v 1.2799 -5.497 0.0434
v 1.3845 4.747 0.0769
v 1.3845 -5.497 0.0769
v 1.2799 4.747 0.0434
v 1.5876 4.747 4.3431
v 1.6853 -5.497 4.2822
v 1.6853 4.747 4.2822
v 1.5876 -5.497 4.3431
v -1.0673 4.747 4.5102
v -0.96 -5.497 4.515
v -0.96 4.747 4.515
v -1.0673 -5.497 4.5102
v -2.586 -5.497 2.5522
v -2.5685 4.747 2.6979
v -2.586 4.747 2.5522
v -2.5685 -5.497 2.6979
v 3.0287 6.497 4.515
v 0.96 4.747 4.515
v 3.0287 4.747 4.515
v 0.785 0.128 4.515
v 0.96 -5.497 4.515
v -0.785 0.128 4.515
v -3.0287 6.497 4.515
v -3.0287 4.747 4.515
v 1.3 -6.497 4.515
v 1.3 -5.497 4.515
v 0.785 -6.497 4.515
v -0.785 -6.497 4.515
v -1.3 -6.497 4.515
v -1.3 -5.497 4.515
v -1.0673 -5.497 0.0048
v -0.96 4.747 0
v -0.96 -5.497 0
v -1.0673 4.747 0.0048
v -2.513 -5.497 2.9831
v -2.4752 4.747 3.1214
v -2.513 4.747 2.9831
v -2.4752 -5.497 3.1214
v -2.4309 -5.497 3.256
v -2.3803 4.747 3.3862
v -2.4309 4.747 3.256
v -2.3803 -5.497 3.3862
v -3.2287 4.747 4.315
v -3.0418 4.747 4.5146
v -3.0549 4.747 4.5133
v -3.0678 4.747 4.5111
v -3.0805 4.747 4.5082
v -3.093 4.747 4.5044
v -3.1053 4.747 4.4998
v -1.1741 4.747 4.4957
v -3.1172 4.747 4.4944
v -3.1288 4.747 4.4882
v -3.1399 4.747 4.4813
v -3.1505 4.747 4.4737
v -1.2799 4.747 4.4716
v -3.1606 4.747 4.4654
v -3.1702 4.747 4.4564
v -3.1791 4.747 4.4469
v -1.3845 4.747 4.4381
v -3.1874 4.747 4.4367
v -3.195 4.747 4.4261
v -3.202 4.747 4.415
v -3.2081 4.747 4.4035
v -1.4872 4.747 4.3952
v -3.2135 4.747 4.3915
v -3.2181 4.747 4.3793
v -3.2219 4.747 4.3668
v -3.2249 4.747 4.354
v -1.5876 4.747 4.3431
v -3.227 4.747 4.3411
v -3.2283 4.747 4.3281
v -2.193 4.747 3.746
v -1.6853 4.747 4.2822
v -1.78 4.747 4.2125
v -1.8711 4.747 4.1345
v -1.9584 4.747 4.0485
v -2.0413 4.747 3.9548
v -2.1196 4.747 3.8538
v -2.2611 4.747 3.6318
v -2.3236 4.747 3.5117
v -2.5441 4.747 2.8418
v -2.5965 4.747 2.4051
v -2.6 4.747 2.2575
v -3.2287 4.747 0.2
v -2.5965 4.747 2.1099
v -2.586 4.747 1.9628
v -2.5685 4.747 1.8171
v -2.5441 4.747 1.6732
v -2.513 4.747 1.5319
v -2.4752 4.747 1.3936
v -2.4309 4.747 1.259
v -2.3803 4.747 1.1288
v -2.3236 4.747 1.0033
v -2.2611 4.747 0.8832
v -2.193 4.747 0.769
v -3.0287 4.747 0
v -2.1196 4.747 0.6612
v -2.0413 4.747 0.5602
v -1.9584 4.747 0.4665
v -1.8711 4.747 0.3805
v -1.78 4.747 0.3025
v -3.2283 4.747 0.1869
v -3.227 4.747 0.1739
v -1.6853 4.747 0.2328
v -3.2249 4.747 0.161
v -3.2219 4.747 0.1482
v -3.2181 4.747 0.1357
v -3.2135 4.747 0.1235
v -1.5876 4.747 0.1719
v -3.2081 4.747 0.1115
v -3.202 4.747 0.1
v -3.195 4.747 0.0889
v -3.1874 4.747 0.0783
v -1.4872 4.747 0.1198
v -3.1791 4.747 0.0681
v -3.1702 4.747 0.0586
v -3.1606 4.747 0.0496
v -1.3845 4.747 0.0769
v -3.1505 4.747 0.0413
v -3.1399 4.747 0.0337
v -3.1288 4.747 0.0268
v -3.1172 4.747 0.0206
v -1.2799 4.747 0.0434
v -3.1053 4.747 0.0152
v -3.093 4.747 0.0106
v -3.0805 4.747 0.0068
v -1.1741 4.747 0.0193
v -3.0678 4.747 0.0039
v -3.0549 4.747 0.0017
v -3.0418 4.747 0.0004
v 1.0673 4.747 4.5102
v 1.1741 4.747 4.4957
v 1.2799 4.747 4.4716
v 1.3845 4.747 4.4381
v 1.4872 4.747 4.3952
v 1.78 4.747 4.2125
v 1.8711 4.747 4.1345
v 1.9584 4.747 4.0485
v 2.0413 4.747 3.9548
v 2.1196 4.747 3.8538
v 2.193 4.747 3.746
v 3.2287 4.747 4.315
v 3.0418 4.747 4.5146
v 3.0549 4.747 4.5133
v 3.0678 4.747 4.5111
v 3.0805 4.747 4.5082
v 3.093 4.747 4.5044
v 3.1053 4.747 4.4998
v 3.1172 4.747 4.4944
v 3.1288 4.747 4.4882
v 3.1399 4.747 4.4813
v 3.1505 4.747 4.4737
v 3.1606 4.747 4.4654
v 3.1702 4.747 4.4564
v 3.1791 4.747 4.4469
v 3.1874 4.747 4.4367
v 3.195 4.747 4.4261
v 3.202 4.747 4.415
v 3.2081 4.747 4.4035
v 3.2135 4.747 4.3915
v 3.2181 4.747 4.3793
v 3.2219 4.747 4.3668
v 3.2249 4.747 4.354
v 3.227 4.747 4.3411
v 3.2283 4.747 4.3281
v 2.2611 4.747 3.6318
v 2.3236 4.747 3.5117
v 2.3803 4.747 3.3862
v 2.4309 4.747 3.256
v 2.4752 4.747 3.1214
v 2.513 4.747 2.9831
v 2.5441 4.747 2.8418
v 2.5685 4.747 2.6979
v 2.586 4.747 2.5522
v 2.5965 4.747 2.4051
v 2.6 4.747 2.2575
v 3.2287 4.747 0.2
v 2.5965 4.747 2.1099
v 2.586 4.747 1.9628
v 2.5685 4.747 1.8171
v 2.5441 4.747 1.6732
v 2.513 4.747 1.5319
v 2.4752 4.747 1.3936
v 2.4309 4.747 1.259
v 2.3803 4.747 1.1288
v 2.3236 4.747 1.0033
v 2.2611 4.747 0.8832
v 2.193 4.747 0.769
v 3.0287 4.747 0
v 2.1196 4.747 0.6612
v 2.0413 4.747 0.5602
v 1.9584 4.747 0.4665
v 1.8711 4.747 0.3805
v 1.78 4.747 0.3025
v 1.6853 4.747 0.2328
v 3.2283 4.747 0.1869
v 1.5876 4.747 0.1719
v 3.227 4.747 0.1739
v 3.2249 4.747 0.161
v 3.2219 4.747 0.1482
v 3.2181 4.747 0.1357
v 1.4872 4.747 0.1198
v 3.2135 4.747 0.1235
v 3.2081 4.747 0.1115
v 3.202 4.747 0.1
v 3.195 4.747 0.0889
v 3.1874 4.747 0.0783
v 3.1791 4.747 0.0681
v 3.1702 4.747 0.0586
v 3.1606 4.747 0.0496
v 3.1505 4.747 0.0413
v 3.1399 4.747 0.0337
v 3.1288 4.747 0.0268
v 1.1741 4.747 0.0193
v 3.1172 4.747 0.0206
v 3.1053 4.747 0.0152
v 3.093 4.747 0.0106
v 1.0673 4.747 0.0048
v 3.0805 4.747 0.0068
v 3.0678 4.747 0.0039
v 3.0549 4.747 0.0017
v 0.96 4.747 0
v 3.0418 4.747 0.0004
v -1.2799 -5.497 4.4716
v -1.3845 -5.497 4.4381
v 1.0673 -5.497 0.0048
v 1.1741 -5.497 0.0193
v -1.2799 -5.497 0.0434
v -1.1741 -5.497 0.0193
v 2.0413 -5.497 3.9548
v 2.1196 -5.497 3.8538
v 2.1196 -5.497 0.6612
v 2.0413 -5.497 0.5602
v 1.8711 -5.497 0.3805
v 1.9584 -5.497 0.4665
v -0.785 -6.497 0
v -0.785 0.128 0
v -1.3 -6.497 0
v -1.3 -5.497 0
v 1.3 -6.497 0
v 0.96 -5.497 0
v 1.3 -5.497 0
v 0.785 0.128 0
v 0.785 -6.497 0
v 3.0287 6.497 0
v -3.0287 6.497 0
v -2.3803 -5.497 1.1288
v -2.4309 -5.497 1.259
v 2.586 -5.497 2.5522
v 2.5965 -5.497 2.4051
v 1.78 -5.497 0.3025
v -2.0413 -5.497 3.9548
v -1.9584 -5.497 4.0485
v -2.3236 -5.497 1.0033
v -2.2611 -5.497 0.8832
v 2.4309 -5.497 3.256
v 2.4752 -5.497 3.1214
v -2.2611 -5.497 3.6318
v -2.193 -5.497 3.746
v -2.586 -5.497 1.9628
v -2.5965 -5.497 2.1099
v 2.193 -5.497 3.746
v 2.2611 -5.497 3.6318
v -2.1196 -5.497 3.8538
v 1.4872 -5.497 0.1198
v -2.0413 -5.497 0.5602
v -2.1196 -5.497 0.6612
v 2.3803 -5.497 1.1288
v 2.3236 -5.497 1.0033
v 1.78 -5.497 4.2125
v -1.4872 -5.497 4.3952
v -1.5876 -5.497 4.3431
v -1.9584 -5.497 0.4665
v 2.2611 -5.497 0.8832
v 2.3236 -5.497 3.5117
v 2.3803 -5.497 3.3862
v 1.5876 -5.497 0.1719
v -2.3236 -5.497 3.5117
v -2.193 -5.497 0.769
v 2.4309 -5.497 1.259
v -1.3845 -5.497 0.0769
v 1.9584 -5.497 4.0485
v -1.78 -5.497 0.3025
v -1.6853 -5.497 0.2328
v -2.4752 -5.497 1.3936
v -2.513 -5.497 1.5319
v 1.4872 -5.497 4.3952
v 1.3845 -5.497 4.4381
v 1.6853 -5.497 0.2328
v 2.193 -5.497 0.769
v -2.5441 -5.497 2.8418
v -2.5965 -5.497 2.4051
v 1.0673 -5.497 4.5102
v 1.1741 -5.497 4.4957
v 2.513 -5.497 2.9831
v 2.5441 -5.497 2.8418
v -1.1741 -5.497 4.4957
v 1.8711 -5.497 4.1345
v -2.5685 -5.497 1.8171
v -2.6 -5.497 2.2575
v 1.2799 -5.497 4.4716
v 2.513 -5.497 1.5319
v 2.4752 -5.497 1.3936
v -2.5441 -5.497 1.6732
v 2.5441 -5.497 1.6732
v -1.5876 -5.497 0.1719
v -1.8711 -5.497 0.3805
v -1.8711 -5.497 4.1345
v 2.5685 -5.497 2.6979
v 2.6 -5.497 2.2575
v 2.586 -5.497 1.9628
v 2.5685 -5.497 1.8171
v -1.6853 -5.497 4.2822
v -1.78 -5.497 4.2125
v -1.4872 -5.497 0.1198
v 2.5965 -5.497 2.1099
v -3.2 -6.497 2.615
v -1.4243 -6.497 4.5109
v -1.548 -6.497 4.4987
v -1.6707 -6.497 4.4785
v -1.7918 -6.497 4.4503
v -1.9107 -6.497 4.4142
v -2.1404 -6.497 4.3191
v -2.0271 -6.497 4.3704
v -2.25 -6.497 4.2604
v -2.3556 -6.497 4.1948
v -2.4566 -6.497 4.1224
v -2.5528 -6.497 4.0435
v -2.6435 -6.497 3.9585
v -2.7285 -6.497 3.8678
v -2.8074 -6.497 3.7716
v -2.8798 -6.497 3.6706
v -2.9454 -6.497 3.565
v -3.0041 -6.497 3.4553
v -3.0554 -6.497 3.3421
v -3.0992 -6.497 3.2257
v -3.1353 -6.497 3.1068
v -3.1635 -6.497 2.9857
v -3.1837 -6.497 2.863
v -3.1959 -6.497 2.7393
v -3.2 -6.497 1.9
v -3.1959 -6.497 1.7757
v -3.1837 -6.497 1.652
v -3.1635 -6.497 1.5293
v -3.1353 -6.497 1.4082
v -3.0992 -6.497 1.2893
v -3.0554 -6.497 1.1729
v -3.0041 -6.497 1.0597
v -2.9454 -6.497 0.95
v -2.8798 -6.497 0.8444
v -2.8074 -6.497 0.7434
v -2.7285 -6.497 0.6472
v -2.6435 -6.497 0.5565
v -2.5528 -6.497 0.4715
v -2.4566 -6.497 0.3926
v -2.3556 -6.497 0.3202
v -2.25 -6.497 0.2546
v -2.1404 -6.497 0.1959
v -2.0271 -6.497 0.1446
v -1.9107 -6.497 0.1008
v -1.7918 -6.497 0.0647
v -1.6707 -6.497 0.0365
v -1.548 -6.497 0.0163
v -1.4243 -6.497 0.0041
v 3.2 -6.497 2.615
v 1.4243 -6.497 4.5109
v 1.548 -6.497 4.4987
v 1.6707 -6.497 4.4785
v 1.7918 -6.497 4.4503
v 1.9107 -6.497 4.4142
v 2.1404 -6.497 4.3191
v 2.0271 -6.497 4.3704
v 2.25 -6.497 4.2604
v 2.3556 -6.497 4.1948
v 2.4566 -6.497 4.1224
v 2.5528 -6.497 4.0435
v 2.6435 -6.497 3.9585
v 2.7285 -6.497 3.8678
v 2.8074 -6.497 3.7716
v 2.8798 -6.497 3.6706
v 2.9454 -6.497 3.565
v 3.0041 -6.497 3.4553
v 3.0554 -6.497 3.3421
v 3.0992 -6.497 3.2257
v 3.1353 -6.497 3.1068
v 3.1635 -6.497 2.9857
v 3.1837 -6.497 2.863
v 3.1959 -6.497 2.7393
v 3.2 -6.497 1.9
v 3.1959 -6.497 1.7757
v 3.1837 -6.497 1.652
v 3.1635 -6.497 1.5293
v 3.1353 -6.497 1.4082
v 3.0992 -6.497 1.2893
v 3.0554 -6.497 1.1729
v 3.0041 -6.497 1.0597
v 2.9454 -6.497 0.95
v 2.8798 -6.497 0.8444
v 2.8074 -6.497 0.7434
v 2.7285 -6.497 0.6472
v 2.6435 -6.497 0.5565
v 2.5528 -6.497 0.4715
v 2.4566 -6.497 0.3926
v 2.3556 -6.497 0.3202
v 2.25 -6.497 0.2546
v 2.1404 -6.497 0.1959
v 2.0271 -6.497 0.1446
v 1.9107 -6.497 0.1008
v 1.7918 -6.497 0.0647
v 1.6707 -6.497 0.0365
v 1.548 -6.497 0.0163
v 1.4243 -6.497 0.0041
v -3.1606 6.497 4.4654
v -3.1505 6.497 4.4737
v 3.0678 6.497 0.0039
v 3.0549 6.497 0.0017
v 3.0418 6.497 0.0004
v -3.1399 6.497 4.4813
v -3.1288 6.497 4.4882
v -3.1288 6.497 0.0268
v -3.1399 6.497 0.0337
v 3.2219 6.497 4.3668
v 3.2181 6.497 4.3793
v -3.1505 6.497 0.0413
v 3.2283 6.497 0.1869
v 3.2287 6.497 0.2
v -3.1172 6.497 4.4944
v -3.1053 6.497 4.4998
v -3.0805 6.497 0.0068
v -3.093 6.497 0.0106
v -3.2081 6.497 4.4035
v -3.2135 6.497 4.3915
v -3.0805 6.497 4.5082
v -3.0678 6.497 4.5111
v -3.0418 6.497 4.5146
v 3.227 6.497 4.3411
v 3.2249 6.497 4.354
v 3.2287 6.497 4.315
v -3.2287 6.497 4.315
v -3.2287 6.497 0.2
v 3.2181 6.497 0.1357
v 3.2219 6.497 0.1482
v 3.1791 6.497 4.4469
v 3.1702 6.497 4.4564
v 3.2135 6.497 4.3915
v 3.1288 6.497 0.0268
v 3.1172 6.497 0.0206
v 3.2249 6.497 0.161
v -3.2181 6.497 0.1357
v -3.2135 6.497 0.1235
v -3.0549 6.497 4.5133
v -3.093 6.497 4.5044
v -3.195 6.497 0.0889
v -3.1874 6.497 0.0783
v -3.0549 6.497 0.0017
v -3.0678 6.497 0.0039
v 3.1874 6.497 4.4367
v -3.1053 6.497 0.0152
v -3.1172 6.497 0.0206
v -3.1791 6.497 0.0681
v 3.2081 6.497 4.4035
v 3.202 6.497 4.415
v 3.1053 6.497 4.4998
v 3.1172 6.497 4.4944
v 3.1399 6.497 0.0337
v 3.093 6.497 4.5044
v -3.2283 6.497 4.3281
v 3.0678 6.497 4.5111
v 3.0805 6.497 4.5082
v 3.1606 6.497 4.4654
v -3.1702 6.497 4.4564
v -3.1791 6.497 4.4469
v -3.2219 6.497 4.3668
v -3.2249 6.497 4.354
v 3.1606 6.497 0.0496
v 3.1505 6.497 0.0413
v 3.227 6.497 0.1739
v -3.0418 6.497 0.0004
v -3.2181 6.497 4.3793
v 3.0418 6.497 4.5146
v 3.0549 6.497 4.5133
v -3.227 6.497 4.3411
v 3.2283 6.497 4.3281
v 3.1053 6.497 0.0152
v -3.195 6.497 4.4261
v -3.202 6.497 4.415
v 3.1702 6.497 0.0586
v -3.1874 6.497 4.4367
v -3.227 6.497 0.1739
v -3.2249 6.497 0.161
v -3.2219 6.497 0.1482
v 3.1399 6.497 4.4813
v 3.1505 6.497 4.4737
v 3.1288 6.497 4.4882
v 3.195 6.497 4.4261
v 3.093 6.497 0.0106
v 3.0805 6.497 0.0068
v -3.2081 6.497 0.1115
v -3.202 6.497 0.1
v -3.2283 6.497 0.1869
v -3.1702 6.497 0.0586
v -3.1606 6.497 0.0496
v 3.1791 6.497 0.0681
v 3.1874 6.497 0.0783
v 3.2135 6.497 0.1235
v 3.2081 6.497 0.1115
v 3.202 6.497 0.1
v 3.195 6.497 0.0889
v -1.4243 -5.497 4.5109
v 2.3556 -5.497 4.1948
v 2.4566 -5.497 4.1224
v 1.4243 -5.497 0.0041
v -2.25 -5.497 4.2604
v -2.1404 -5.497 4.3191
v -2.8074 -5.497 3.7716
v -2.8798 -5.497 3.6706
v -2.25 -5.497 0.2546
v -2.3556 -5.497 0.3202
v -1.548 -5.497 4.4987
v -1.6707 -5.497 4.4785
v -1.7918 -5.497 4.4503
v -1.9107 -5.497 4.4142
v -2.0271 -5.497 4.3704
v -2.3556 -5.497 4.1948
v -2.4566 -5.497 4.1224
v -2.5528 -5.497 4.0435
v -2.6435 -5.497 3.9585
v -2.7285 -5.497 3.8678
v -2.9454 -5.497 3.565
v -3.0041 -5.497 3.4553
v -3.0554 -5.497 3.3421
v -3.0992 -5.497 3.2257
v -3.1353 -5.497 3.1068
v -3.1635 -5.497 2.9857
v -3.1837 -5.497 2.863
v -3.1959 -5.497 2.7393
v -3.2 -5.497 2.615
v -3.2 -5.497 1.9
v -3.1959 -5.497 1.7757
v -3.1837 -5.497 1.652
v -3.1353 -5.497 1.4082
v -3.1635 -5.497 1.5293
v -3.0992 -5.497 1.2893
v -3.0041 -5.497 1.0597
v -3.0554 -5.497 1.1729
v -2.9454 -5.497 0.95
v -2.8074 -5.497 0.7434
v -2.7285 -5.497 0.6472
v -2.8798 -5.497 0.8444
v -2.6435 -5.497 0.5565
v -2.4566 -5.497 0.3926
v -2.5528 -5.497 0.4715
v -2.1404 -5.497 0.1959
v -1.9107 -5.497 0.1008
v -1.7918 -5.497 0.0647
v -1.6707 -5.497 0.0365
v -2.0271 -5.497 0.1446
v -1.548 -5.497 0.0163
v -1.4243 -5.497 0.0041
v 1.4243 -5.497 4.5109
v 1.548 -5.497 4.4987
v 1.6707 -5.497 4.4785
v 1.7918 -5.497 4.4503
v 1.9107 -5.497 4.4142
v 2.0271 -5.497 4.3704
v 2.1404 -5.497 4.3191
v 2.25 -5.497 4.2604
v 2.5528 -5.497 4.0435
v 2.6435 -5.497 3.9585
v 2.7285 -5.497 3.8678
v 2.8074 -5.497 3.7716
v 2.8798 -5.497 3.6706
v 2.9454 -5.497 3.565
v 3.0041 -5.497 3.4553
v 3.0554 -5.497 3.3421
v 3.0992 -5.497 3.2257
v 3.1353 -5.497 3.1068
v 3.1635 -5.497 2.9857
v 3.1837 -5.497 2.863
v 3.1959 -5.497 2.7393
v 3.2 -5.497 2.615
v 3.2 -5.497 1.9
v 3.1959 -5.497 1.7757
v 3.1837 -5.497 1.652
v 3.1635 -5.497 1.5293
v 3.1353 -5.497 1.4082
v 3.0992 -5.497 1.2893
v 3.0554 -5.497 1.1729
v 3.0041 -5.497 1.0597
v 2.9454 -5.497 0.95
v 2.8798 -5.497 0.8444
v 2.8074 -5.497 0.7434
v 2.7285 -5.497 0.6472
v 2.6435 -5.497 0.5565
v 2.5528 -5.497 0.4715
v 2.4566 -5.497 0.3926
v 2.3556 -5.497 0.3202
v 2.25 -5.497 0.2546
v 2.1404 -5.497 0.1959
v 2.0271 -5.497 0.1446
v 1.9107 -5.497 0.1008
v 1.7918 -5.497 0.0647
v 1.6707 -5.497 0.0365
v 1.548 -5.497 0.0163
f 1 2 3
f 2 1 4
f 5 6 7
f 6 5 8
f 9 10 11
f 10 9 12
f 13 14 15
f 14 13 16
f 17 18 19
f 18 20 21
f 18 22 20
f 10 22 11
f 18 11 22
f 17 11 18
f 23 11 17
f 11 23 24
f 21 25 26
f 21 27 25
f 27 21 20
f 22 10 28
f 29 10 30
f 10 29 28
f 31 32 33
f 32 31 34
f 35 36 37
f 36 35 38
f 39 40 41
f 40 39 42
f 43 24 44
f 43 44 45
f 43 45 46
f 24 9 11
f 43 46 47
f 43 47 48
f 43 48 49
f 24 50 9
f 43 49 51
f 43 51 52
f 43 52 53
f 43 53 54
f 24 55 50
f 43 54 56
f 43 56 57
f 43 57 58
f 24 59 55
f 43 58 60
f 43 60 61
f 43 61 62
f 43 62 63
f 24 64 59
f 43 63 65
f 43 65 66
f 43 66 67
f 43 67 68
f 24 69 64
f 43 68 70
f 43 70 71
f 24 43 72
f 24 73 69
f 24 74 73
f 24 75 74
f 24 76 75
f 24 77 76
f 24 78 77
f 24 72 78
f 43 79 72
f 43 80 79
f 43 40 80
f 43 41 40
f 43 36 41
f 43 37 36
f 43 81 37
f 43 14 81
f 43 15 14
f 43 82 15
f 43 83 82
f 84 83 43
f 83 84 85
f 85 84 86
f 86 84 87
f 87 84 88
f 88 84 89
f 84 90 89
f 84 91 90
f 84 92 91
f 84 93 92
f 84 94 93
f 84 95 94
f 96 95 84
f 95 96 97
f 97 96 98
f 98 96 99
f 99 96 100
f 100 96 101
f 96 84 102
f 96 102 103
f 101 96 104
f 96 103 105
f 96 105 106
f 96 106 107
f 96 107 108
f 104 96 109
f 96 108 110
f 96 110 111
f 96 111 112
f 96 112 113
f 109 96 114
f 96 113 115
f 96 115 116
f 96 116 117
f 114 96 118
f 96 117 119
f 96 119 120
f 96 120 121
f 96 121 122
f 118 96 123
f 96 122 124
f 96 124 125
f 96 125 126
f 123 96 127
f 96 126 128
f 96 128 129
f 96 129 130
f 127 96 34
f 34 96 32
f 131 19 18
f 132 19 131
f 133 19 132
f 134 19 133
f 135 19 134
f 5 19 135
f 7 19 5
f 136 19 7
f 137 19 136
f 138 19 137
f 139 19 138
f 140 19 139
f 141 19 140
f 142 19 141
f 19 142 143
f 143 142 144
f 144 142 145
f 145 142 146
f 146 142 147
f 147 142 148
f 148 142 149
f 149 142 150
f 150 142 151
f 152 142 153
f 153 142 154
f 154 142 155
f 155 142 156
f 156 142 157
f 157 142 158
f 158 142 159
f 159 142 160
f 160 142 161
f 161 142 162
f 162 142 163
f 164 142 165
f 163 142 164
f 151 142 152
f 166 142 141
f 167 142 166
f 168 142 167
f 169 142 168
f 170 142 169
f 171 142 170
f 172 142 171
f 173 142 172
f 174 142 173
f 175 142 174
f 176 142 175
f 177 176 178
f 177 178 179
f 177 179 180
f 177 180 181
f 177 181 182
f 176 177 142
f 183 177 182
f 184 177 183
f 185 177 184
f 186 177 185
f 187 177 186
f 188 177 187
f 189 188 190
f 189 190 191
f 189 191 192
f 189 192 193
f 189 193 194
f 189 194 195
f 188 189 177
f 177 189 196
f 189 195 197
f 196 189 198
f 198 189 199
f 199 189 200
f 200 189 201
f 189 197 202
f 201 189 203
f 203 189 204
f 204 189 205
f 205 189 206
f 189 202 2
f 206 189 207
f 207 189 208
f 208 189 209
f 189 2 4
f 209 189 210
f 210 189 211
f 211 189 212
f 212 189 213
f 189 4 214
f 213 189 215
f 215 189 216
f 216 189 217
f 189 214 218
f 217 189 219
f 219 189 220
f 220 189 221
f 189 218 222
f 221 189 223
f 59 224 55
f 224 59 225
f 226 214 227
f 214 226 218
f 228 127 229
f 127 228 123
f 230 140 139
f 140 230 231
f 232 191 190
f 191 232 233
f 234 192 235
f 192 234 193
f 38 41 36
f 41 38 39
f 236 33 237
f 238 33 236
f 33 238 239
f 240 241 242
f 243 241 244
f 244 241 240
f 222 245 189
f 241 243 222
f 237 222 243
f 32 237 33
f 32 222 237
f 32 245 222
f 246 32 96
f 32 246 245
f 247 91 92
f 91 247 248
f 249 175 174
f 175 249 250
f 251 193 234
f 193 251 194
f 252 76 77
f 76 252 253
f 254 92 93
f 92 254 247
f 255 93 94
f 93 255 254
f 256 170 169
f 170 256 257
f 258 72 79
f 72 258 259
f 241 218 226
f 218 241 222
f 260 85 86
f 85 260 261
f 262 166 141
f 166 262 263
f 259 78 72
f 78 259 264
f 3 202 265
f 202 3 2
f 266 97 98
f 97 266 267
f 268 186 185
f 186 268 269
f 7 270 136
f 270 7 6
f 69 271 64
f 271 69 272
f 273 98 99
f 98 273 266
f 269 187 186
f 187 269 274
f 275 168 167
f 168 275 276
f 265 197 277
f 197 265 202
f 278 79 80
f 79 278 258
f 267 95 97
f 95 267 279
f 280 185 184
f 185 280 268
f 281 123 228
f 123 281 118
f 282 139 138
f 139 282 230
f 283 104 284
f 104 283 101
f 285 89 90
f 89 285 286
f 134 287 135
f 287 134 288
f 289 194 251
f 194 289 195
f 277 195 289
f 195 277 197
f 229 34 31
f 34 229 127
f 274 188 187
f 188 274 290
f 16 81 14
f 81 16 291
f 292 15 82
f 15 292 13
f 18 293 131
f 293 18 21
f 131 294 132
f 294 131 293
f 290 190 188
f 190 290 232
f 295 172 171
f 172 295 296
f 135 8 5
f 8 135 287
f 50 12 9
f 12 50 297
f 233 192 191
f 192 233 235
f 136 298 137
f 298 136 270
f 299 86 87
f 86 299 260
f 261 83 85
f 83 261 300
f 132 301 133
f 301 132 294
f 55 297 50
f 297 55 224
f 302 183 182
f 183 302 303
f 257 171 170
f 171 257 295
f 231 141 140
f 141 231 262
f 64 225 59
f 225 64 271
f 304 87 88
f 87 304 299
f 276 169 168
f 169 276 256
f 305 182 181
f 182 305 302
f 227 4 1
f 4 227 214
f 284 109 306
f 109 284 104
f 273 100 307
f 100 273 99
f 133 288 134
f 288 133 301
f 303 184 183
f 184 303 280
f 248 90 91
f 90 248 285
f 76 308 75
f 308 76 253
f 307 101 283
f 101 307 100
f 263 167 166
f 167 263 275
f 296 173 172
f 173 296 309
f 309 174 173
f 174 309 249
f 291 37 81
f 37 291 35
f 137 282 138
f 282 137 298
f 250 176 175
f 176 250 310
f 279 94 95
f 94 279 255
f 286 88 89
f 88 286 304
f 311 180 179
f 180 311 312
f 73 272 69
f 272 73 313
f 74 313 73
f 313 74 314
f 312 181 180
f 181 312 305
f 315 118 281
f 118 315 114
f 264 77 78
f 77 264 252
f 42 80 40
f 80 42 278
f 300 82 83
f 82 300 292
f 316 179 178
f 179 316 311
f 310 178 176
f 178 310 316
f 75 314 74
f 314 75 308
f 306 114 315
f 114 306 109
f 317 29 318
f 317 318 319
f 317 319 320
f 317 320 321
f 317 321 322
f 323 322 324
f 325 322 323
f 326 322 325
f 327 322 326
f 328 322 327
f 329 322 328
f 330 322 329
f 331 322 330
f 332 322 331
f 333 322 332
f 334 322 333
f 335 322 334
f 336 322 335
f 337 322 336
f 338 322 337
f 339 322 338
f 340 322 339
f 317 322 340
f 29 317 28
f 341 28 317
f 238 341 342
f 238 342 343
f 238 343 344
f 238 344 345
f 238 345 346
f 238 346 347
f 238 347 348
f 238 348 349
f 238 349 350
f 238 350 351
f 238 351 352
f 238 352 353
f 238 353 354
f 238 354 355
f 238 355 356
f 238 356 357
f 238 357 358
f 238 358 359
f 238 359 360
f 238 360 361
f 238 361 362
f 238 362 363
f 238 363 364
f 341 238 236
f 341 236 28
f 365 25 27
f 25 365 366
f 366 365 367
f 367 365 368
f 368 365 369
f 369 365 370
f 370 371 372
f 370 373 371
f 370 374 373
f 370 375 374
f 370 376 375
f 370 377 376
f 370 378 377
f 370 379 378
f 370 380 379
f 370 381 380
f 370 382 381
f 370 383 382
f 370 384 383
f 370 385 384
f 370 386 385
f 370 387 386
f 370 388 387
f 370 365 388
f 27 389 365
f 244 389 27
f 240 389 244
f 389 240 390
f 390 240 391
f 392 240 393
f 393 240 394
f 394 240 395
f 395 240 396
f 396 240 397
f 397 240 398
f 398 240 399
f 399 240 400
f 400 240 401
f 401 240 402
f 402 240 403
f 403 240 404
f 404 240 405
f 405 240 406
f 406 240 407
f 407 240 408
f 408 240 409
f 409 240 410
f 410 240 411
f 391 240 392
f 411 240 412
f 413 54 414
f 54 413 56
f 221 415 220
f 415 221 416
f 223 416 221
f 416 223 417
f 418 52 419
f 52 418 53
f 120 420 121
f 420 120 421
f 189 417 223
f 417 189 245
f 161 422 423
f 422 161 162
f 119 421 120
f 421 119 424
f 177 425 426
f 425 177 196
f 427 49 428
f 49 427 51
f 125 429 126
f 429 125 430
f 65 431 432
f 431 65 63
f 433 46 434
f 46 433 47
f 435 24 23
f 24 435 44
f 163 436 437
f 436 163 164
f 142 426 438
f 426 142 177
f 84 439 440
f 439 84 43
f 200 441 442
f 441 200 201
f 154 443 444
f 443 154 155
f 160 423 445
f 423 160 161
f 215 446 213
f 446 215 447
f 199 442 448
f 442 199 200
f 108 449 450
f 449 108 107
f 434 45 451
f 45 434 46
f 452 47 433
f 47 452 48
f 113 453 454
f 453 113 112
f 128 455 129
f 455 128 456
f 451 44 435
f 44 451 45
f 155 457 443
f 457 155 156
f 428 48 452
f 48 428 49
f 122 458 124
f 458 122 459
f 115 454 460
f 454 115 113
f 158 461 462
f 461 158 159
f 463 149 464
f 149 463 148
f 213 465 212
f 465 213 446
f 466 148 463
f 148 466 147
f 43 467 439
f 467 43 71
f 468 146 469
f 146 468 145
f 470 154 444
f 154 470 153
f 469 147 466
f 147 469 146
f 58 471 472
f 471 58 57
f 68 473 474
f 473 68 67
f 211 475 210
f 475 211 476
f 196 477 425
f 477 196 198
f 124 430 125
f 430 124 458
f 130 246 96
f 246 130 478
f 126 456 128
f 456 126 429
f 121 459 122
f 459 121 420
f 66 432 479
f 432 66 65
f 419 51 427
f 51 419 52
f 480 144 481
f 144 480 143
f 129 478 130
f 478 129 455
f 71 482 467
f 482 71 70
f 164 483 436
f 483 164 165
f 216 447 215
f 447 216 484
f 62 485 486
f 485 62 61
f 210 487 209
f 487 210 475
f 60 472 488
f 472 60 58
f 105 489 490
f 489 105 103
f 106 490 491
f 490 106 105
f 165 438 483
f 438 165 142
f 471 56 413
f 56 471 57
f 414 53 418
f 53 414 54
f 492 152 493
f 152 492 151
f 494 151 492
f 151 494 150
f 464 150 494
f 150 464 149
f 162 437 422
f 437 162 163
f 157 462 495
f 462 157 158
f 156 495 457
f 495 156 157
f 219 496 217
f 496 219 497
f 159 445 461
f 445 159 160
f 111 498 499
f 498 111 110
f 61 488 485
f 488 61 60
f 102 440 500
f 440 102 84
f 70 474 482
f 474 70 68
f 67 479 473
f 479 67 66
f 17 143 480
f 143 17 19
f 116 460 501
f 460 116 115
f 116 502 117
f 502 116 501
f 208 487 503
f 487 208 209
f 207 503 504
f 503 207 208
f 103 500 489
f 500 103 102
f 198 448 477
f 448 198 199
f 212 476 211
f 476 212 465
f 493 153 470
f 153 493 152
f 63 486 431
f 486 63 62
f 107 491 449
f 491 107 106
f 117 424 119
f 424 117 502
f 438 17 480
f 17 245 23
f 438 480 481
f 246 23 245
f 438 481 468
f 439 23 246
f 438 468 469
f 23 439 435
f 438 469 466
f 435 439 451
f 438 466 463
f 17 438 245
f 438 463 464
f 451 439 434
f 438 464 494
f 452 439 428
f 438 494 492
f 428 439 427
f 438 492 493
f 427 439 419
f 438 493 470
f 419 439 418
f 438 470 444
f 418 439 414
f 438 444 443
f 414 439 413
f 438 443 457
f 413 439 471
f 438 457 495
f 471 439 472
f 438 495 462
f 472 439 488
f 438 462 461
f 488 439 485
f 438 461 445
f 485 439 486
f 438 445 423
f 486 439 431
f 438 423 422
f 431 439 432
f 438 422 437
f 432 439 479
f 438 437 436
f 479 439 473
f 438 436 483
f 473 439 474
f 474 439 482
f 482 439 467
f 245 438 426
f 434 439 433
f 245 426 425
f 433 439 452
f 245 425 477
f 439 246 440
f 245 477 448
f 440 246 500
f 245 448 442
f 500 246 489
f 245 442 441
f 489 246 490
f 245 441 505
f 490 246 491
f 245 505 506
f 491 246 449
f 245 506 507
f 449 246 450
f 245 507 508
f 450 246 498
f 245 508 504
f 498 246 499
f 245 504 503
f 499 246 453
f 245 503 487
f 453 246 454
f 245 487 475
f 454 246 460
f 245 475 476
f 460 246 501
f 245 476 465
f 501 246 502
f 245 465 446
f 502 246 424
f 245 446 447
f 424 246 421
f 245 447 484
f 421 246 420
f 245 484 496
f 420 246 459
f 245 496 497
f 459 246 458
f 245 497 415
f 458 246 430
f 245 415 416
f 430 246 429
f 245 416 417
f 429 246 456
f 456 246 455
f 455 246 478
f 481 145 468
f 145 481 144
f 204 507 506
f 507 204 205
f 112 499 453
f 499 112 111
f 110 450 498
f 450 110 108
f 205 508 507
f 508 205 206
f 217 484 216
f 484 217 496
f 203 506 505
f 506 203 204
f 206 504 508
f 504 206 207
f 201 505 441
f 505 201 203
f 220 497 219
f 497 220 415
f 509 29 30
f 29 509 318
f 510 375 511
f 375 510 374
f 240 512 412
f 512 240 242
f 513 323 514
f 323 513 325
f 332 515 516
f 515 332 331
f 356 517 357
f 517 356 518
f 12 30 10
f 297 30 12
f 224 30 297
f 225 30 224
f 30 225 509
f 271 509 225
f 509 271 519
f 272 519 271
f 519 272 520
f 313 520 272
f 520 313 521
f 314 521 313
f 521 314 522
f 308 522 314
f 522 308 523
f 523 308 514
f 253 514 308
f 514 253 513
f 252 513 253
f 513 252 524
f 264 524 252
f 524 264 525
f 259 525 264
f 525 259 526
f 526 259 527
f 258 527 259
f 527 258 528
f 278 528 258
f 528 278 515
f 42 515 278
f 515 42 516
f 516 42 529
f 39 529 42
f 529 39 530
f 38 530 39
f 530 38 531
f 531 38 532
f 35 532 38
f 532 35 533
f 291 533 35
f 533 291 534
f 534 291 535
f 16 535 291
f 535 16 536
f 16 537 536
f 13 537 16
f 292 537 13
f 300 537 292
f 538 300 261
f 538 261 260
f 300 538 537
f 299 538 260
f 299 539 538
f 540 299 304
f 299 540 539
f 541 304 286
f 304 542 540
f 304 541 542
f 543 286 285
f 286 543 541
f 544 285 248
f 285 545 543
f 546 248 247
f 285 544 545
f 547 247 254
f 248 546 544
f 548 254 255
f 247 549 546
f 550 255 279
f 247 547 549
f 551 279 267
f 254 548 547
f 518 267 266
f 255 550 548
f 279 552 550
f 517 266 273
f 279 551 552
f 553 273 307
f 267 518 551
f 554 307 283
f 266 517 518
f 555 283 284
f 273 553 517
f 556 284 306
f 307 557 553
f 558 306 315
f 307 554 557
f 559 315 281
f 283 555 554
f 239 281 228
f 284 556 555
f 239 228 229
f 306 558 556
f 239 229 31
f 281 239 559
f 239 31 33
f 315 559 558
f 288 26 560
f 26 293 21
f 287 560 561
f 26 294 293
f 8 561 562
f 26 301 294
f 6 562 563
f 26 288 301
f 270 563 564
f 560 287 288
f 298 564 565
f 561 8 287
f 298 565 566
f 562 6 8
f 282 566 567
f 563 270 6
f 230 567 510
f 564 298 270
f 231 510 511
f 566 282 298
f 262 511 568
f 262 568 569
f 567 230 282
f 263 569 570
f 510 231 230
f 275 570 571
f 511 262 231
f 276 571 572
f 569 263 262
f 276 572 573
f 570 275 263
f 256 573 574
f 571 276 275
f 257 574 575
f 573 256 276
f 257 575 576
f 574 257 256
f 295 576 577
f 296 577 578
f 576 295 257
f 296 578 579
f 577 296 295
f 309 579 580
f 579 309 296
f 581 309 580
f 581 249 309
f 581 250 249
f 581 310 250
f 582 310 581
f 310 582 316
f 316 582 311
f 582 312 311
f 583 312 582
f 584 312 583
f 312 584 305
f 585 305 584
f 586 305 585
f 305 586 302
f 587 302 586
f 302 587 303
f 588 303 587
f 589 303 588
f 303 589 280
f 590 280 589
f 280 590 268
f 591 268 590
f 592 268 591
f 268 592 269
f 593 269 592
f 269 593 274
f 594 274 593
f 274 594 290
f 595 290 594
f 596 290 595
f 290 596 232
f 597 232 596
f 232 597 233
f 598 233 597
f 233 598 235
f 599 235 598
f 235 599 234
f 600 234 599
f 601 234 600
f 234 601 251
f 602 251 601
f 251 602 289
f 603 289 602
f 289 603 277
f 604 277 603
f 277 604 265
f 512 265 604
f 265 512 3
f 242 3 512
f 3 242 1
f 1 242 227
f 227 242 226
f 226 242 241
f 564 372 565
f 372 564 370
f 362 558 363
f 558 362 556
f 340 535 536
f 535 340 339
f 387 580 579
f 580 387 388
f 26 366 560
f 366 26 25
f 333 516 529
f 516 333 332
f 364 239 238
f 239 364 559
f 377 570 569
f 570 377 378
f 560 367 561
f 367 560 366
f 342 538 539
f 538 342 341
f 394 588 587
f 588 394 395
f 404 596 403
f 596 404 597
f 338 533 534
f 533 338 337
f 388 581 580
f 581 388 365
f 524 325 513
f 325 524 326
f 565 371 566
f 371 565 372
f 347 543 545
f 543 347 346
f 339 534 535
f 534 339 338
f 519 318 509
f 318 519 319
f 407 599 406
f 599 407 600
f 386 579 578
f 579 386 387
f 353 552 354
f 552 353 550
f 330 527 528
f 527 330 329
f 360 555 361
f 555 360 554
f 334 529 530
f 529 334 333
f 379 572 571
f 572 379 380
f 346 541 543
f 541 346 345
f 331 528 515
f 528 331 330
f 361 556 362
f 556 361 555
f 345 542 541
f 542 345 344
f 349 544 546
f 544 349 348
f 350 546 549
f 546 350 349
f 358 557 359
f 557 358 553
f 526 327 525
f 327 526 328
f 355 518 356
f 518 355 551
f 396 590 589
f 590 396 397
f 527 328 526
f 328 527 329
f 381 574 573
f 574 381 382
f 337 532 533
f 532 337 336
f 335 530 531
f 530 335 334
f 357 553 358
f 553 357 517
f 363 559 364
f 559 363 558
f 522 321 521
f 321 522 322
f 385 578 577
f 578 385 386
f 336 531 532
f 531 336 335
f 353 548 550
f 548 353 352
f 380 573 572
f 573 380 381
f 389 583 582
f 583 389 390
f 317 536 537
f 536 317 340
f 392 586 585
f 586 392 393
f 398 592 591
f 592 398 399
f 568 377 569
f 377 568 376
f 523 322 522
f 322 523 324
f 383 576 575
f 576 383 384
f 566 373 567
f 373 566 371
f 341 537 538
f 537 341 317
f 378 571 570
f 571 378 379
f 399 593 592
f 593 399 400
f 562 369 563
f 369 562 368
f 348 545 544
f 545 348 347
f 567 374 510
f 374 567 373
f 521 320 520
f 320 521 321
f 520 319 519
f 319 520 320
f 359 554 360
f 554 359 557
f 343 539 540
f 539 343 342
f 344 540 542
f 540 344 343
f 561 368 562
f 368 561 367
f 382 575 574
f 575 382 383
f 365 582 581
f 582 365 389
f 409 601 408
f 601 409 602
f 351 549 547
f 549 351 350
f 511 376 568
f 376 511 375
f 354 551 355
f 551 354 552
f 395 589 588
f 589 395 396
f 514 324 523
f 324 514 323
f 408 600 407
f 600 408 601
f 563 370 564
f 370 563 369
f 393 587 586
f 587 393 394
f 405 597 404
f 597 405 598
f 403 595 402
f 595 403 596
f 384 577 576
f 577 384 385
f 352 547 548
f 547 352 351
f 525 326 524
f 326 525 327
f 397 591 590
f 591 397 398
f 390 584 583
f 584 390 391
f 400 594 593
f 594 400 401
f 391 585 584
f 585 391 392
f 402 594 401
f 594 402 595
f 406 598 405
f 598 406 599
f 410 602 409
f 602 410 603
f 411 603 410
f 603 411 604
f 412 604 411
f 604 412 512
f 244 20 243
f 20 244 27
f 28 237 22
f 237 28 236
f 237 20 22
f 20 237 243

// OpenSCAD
// ============================================
// Reborn_wrist_pin.stl reconstruction
// Snap-pin family: rounded shaft (rect + elliptical half-pipes) + wide head (+Y)
// + slotted legs + wide rounded feet/barbs (-Y). Centred at origin (X0 Y0, z0 bottom).
// ============================================
$fn = 96;
eps = 0.05;

L          = 12.994;   // total length (Y)
shaft      = [4.515, 0.96, 1.64, 2.2575];  // [height, rect_hw, ellipse_rx, ellipse_rz] (area-matched)
head_w     = 6.4575;   // head full width (X)
head_len   = 1.75;     // head length (Y), at +Y
head_r     = 0.20;     // head corner round
slot_w     = 1.57;
fork       = 6.60;     // slot length from the -Y tip
foot_w     = 6.40;     // feet/barb width (X), at -Y
foot_len   = 1.00;
foot_r     = 1.90;     // feet corner round

// shaft cross-section (X-Z): central rectangle + elliptical half-pipe sides, bottom z=0
module pin_xsec(sh, rhw, erx, erz)
    translate([0, sh/2]) union() {
        square([rhw*2, sh], center = true);
        for (s = [-1, 1]) translate([s*rhw, 0]) scale([erx, erz]) circle(r = 1);
    };
module pin_shaft(len, sp)
    rotate([90, 0, 0]) linear_extrude(len, center = true)
        pin_xsec(sp[0], sp[1], sp[2], sp[3]);
module rr_rod(len, w, h, r)
    rotate([90, 0, 0]) linear_extrude(len, center = true)
        translate([0, h/2]) offset(r) offset(-r) square([w, h], center=true);

module wrist_pin() {
    h = shaft[0];
    shaft_len = L - head_len;            // shaft runs from -L/2 up to head
    difference() {
        union() {
            translate([0, -head_len/2, 0]) pin_shaft(shaft_len, shaft);
            translate([0, L/2 - head_len/2, 0]) rr_rod(head_len, head_w, h, head_r);
            translate([0, -L/2 + foot_len/2, 0]) rr_rod(foot_len, foot_w, h, foot_r);
        }
        translate([0, -L/2 + fork/2, h/2])
            cube([slot_w, fork + eps, h + 2*eps], center=true);
    }
}

wrist_pin();
